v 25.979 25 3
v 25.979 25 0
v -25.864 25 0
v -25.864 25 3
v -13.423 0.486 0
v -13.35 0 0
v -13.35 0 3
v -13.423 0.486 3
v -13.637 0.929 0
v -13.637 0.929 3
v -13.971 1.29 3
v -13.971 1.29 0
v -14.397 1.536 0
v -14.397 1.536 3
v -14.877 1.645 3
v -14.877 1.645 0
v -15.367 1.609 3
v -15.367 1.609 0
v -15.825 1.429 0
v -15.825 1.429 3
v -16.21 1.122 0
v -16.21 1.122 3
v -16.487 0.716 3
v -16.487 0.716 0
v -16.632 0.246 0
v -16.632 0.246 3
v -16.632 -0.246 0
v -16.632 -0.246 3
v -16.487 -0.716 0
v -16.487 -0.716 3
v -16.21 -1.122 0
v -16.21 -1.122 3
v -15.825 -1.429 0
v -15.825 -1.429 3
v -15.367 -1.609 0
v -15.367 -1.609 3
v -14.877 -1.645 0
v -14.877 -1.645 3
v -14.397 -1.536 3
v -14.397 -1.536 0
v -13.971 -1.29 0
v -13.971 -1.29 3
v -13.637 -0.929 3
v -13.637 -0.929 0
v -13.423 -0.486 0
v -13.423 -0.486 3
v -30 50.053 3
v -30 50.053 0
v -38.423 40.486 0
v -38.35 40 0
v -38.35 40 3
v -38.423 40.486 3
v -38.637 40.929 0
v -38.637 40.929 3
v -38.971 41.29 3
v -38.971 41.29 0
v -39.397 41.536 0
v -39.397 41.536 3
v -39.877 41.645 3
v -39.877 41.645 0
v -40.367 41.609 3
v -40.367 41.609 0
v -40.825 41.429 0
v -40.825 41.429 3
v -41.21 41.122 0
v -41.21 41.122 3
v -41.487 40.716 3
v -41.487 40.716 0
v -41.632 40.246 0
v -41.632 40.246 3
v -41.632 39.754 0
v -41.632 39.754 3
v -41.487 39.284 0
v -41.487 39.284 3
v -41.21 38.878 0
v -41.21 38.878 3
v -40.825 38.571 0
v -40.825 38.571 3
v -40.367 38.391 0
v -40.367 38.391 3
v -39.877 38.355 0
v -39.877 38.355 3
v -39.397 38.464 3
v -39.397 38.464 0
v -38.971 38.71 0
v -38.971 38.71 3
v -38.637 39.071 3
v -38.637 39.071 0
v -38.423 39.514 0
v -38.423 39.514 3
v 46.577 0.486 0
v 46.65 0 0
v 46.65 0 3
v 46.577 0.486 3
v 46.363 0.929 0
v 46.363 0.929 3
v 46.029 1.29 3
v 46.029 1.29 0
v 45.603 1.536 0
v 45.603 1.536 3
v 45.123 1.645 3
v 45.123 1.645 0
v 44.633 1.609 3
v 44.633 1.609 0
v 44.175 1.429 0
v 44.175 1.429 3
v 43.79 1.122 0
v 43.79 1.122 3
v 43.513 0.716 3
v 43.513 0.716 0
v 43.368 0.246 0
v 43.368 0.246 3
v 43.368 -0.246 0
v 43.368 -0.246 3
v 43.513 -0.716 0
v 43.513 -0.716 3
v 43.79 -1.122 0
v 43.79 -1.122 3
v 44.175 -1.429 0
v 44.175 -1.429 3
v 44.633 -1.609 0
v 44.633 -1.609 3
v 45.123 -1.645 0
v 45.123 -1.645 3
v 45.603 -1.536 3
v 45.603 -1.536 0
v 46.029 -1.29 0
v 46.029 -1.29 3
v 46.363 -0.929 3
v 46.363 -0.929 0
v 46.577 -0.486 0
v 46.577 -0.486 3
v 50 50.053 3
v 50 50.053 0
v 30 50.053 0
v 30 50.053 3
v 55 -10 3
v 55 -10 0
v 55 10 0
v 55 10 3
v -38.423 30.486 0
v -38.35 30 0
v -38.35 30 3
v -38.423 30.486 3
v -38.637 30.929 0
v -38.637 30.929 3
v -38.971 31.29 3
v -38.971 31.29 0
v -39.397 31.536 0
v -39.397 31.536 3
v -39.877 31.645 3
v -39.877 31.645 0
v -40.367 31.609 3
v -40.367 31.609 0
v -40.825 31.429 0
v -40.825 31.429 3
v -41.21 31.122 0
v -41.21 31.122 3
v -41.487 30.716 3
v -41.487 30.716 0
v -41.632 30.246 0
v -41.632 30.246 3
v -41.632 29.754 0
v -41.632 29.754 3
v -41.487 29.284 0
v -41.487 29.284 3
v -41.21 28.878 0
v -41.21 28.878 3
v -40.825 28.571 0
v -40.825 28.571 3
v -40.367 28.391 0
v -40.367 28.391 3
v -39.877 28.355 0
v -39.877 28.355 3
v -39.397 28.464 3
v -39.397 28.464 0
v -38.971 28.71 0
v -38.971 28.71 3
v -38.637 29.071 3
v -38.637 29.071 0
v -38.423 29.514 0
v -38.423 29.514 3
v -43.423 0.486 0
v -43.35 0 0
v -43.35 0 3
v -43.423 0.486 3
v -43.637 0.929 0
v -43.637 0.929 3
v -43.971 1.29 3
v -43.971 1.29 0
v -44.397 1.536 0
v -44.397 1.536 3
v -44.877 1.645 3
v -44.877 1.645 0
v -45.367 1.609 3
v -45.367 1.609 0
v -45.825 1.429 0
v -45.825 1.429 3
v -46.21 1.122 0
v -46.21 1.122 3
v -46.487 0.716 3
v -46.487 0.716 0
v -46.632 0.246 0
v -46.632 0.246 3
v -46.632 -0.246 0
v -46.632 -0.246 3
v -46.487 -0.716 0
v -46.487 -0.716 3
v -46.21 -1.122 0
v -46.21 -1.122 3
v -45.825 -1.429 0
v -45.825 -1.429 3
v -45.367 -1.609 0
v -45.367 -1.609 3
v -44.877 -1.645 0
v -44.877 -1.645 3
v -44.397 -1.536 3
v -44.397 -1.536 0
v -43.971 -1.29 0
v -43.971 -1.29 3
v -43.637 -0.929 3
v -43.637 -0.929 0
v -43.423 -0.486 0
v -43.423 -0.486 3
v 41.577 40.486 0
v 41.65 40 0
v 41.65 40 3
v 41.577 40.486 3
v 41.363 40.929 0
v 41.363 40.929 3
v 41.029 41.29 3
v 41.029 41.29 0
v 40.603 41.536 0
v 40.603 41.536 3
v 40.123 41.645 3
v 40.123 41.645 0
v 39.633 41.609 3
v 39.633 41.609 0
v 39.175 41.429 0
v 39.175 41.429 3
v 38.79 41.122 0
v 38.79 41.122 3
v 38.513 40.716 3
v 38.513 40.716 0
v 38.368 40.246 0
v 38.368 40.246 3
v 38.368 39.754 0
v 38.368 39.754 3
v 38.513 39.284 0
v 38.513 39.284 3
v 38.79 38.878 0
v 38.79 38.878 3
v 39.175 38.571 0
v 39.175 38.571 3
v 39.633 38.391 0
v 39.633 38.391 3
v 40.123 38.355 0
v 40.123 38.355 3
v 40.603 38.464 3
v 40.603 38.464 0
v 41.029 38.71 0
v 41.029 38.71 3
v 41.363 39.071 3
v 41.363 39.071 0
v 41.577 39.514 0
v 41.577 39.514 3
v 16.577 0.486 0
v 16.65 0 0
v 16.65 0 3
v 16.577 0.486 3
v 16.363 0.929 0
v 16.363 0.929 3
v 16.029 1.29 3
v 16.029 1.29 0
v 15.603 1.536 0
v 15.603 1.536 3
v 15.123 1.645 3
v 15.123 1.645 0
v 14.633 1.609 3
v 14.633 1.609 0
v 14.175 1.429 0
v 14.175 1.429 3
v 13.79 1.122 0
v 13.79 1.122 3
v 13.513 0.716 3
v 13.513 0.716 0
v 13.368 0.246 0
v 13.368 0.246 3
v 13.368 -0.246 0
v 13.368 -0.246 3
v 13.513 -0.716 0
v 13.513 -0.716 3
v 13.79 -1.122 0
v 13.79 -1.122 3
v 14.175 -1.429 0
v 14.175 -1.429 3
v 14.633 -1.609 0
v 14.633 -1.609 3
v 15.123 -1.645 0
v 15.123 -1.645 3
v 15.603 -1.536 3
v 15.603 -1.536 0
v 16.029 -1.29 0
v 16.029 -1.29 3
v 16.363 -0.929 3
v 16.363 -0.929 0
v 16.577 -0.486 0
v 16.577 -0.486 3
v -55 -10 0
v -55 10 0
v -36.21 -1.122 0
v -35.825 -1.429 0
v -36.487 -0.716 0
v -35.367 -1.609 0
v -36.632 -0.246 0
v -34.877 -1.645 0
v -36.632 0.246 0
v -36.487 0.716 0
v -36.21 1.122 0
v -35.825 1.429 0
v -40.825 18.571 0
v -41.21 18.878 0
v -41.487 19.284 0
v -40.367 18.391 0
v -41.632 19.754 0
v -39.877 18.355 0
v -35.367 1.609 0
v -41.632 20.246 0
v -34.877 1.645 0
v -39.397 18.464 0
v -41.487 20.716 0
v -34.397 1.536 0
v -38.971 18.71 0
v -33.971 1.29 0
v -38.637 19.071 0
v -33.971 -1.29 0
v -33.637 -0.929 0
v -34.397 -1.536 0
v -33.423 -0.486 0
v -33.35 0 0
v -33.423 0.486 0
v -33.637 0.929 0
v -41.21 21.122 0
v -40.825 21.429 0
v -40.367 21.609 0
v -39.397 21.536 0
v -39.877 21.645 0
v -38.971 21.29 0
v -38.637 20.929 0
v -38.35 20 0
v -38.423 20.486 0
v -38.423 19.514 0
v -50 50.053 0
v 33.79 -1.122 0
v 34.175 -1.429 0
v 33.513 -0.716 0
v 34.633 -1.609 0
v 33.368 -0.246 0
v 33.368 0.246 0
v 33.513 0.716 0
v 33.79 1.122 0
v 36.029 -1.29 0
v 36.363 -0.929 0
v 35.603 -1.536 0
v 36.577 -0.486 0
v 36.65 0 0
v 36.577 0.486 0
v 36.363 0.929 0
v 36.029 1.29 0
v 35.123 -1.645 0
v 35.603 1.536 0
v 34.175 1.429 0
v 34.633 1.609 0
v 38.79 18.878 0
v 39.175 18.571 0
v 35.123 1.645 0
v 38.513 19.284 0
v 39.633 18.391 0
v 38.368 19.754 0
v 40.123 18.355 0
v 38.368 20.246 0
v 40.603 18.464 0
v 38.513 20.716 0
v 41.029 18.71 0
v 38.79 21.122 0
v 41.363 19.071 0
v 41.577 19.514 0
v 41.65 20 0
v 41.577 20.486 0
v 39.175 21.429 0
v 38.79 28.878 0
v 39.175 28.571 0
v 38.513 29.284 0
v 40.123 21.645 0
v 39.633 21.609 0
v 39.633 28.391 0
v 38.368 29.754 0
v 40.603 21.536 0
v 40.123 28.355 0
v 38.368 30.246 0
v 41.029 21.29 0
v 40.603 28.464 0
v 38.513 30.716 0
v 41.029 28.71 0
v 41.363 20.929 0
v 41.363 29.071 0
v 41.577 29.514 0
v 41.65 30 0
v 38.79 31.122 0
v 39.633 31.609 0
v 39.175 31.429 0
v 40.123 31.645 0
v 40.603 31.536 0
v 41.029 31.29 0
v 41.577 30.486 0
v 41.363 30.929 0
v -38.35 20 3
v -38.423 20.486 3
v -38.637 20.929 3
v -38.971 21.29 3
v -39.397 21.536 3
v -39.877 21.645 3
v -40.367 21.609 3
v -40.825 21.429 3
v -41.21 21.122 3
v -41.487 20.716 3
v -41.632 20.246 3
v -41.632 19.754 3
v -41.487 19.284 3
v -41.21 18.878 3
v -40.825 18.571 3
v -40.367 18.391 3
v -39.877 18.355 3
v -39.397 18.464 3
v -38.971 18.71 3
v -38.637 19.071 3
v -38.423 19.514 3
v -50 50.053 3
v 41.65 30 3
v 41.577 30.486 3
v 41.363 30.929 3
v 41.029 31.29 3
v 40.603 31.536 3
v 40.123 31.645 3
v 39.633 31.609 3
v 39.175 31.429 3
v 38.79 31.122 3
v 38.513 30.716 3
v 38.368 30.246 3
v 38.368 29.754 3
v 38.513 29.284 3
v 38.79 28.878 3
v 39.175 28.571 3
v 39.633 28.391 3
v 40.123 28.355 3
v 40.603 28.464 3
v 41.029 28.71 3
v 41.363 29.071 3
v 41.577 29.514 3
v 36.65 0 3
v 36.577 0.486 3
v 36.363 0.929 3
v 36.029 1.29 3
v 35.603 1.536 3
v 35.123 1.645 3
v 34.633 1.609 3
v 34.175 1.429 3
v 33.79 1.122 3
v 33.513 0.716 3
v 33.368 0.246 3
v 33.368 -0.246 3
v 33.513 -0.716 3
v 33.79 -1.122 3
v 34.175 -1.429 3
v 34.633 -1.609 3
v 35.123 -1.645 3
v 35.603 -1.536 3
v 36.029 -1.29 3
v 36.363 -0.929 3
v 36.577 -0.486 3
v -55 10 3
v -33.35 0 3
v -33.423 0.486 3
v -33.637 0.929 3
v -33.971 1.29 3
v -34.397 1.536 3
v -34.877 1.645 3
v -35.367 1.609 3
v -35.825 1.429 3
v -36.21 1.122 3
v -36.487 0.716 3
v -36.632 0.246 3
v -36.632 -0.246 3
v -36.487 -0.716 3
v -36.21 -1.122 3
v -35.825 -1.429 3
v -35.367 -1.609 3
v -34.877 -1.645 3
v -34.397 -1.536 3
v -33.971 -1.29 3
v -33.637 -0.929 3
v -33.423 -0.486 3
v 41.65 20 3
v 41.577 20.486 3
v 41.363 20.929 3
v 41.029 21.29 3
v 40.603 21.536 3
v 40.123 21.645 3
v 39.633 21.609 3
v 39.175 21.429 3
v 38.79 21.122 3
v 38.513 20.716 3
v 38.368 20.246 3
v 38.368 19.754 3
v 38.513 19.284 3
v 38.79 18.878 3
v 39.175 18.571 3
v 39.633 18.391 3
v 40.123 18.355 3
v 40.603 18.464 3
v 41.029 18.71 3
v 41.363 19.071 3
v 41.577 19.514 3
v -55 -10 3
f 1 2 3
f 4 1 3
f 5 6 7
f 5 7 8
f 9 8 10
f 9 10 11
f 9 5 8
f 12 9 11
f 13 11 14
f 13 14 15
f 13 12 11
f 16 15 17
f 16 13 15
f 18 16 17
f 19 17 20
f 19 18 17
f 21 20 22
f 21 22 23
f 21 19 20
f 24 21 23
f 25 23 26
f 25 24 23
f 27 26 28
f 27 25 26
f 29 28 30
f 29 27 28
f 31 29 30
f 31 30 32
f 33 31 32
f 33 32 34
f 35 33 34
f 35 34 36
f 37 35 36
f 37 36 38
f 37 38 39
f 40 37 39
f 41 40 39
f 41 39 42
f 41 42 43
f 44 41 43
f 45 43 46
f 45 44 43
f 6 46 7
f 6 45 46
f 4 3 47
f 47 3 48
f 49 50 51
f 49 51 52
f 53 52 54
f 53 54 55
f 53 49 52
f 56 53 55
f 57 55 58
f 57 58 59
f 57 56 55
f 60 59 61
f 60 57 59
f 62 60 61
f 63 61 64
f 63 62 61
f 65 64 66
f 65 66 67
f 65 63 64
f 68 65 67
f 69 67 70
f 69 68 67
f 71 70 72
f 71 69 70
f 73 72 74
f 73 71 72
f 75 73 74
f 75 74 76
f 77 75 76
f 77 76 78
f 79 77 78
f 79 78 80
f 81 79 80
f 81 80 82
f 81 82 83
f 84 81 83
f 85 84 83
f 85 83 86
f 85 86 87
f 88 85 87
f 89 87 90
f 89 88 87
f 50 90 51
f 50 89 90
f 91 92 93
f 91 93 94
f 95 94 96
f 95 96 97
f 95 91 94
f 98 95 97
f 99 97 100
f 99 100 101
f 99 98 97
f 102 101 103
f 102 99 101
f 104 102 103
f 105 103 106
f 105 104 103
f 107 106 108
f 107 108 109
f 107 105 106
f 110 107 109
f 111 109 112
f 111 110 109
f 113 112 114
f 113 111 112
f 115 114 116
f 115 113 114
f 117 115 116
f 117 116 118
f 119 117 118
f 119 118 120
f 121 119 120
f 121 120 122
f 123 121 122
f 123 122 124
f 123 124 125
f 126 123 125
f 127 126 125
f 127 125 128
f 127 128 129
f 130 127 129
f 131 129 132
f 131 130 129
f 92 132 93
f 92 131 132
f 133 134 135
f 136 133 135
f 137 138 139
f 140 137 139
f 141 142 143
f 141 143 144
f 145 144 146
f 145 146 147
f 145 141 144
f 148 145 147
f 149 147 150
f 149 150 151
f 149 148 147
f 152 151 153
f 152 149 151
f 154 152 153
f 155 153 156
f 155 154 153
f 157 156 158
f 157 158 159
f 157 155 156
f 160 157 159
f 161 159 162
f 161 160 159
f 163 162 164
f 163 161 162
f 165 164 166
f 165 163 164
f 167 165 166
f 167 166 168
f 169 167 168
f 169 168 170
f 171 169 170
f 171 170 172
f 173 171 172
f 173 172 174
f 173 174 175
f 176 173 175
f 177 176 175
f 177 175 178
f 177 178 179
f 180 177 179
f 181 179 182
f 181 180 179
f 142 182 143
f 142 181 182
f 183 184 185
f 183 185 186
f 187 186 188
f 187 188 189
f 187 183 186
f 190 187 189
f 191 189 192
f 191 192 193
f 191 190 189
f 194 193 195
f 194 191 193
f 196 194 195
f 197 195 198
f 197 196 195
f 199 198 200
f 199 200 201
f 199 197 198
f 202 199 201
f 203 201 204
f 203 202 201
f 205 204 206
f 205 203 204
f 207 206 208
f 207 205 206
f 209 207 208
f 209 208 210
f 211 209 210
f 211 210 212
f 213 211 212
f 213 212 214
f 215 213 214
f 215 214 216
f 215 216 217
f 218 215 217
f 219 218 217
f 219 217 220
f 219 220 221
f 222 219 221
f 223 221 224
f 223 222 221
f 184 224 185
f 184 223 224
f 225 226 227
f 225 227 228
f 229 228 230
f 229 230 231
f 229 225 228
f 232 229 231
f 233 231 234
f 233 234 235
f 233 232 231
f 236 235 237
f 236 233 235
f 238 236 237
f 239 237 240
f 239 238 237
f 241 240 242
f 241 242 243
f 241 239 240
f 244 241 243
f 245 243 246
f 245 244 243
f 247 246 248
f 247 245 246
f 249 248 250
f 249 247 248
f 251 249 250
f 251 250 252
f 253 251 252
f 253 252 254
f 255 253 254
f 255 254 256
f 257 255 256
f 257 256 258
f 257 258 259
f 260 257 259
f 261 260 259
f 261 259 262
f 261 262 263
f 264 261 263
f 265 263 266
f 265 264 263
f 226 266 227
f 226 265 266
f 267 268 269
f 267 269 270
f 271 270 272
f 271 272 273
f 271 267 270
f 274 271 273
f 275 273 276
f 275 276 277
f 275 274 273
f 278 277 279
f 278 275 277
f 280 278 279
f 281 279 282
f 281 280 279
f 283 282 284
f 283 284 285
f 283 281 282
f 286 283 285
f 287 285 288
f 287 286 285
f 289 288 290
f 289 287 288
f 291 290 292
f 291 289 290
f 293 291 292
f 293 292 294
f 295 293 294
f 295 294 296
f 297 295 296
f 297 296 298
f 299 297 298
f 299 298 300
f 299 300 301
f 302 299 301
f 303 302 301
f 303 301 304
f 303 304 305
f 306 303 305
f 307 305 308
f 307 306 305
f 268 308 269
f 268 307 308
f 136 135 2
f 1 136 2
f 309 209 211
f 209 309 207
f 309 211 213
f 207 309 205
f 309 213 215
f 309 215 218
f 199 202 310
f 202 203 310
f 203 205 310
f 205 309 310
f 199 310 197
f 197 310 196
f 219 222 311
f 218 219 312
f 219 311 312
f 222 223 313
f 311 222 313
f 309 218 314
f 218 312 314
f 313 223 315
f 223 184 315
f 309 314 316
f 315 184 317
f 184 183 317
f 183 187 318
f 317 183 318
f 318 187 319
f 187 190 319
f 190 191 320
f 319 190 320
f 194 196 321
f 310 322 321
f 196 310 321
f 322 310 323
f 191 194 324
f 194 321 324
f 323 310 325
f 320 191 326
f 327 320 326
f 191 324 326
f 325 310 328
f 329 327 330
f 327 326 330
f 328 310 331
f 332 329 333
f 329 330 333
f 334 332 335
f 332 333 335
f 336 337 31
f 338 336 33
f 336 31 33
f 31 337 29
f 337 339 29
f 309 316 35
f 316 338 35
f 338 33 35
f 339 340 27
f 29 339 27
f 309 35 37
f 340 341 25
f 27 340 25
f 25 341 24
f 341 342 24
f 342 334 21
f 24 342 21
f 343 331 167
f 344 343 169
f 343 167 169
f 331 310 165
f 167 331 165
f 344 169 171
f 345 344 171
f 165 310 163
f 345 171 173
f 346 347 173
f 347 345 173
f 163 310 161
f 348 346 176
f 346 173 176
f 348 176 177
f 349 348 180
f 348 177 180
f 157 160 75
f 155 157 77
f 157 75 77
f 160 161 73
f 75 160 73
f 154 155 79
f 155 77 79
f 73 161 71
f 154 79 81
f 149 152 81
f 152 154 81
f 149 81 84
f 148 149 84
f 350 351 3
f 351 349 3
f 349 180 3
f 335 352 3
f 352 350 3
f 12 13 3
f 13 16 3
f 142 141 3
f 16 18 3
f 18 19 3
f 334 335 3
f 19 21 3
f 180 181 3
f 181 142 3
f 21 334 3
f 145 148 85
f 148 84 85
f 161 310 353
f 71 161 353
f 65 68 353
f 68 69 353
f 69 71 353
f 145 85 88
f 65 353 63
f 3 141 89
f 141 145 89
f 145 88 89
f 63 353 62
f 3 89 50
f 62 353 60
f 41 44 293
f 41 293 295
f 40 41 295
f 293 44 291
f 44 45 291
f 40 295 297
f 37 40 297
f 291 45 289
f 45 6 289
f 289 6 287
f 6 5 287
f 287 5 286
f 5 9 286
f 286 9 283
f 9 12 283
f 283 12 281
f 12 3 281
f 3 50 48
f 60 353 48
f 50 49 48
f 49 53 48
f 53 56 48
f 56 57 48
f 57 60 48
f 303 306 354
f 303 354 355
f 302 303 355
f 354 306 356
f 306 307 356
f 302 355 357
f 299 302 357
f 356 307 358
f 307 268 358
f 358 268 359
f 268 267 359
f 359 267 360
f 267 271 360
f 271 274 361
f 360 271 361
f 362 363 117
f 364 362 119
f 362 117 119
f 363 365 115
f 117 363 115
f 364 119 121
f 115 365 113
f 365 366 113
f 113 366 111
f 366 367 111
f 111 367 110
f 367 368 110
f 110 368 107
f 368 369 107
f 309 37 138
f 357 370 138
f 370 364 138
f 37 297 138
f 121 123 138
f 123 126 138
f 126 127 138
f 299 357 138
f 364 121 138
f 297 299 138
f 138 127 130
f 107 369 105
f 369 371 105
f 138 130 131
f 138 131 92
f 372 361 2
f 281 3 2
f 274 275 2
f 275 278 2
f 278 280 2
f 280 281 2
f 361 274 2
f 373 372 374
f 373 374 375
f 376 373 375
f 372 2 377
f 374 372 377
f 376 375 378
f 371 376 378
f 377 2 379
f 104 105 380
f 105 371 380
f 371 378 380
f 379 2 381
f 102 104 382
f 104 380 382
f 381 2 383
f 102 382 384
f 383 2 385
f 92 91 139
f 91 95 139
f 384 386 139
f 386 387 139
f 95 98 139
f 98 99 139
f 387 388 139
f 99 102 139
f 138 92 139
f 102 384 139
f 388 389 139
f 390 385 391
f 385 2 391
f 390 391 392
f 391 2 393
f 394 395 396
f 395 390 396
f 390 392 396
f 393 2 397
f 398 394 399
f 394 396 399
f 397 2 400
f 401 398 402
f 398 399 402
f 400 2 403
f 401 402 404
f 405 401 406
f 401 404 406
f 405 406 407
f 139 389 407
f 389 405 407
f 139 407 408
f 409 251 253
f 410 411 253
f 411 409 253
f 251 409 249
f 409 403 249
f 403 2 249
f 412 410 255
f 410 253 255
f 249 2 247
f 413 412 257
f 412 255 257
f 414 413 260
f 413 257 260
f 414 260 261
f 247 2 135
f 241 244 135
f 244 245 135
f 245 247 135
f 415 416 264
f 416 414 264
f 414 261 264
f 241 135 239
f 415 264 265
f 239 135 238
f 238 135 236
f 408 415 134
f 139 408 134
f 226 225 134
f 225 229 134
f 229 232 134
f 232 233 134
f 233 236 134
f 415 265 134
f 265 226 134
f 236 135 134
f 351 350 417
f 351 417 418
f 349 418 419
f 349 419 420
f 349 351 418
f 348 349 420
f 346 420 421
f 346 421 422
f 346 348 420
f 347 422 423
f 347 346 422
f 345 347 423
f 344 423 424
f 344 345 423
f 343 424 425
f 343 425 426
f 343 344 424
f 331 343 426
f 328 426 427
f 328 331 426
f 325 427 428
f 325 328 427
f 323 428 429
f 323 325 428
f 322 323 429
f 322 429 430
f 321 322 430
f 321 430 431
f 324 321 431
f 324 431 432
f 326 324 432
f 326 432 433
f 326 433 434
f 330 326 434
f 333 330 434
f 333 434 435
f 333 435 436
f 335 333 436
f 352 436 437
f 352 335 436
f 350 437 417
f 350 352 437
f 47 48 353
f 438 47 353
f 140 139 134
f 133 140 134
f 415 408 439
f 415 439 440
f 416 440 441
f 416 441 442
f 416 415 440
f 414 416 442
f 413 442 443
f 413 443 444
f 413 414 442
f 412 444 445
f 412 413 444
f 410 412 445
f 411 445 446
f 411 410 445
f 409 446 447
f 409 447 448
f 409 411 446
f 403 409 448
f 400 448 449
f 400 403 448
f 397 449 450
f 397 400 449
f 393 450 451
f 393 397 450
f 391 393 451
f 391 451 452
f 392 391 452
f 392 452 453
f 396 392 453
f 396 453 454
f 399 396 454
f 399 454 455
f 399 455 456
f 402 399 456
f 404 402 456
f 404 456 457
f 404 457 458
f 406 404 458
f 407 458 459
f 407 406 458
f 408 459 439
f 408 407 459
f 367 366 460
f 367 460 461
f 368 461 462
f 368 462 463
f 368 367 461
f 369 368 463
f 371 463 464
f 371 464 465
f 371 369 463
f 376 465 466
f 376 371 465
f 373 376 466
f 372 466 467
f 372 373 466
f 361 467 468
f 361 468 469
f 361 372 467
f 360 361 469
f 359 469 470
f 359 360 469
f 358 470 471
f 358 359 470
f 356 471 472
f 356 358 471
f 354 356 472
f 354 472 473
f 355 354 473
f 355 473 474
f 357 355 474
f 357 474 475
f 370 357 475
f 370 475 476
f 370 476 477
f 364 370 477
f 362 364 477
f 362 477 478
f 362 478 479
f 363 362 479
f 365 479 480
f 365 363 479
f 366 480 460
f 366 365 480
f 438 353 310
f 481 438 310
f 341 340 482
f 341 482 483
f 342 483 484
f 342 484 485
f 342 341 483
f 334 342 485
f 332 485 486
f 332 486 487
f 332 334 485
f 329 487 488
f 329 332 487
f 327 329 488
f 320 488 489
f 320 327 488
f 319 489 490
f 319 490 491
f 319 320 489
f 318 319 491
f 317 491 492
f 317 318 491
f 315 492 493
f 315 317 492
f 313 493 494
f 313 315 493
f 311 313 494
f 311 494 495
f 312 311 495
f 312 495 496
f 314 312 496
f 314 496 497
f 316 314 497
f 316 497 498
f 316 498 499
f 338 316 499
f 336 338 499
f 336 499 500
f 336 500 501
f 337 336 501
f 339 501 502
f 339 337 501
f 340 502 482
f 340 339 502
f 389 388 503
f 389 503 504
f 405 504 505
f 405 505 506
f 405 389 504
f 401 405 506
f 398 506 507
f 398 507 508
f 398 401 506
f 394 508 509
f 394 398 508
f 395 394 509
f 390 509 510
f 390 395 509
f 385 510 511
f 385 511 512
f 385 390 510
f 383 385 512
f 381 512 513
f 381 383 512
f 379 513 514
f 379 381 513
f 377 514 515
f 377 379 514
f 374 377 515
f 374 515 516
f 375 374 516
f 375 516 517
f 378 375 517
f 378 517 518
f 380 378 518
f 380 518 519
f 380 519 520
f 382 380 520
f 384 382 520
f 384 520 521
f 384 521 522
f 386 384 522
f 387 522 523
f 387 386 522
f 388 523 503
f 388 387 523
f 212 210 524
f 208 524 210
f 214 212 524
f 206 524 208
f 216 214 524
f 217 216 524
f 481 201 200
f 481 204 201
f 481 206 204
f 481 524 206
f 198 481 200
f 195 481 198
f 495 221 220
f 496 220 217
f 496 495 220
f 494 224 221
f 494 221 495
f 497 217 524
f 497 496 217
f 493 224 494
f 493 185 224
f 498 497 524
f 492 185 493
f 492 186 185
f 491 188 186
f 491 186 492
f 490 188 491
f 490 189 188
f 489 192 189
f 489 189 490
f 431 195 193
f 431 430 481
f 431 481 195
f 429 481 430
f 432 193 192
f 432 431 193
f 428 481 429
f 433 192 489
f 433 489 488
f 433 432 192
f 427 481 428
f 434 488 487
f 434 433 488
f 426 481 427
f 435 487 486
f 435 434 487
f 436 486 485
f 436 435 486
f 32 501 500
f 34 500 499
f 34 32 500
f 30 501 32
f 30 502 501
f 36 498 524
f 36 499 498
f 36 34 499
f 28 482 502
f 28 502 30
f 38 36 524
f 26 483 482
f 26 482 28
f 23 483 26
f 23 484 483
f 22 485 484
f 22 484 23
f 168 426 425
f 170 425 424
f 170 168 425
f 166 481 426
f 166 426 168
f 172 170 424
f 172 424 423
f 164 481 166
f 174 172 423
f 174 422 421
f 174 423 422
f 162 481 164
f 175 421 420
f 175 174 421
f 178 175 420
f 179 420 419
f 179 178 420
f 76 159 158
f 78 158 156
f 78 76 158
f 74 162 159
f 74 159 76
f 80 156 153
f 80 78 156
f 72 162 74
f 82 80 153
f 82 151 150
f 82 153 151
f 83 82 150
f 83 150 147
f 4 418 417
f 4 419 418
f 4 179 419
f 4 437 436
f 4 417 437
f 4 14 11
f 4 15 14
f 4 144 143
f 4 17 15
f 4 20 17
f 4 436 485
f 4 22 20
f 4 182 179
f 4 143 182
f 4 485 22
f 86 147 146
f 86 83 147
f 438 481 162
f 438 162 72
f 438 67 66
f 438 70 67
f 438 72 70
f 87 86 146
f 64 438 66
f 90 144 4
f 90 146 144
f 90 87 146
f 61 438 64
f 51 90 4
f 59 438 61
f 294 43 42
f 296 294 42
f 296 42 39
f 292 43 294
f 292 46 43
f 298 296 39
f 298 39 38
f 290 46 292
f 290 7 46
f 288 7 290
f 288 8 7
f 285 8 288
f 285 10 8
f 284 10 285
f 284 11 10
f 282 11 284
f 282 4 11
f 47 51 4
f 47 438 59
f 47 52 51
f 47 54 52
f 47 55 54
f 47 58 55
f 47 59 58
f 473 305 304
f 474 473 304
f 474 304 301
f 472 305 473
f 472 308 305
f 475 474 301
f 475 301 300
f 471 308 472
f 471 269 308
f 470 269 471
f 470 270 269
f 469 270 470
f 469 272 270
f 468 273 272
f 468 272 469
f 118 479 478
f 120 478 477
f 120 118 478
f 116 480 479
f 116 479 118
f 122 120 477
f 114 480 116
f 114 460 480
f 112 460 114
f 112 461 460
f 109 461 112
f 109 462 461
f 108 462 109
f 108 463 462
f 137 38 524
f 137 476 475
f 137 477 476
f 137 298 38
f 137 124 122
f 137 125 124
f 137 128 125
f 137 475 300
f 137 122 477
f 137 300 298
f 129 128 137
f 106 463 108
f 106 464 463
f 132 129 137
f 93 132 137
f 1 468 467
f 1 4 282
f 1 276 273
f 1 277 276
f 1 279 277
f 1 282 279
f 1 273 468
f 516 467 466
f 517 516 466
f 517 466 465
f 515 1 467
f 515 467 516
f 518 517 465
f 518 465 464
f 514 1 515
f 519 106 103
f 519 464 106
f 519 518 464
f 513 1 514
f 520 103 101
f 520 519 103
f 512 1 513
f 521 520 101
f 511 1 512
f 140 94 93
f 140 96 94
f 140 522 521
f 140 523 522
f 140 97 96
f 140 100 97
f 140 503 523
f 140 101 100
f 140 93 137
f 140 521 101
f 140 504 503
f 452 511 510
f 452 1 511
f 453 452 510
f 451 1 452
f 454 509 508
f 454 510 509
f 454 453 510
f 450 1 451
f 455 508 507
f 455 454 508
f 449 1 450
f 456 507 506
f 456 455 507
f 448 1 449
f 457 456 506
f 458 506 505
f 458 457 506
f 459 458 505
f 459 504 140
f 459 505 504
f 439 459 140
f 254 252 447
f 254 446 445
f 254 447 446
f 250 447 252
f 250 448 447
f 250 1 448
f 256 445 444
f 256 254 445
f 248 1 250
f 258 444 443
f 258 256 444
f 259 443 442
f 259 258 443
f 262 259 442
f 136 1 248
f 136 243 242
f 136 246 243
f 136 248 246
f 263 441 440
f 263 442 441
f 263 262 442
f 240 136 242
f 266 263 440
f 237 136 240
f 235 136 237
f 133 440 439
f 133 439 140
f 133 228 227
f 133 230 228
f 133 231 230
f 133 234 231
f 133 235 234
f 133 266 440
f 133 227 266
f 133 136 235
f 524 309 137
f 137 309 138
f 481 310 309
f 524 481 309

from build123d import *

# Parameters (mm, degrees)
SKETCH_1_R      = 1.65
EXTRUDE_1_DEPTH = 3


with BuildPart() as part:
    # 草图1 → 凸台-拉伸1 (new body)
    with BuildSketch(Plane.XY):
        Polygon((-55, 10), (-55, -10), (55, -10), (55, 10), (50, 50.05274288), (30, 50.05274288), (25.979309591, 25), (-25.864232627, 25), (-30, 50.05274288), (-50, 50.05274288), align=None)
        with Locations((15, 0)):
            Circle(SKETCH_1_R, mode=Mode.SUBTRACT)
        with Locations((-15, 0)):
            Circle(SKETCH_1_R, mode=Mode.SUBTRACT)
        with Locations((35, 0)):
            Circle(SKETCH_1_R, mode=Mode.SUBTRACT)
        with Locations((-35, 0)):
            Circle(SKETCH_1_R, mode=Mode.SUBTRACT)
        with Locations((45, 0)):
            Circle(SKETCH_1_R, mode=Mode.SUBTRACT)
        with Locations((-45, 0)):
            Circle(SKETCH_1_R, mode=Mode.SUBTRACT)
        with Locations((-40, 20)):
            Circle(SKETCH_1_R, mode=Mode.SUBTRACT)
        with Locations((-40, 30)):
            Circle(SKETCH_1_R, mode=Mode.SUBTRACT)
        with Locations((40, 20)):
            Circle(SKETCH_1_R, mode=Mode.SUBTRACT)
        with Locations((40, 30)):
            Circle(SKETCH_1_R, mode=Mode.SUBTRACT)
        with Locations((-40, 40)):
            Circle(SKETCH_1_R, mode=Mode.SUBTRACT)
        with Locations((40, 40)):
            Circle(SKETCH_1_R, mode=Mode.SUBTRACT)
    extrude(amount=EXTRUDE_1_DEPTH)


solid = part.part
